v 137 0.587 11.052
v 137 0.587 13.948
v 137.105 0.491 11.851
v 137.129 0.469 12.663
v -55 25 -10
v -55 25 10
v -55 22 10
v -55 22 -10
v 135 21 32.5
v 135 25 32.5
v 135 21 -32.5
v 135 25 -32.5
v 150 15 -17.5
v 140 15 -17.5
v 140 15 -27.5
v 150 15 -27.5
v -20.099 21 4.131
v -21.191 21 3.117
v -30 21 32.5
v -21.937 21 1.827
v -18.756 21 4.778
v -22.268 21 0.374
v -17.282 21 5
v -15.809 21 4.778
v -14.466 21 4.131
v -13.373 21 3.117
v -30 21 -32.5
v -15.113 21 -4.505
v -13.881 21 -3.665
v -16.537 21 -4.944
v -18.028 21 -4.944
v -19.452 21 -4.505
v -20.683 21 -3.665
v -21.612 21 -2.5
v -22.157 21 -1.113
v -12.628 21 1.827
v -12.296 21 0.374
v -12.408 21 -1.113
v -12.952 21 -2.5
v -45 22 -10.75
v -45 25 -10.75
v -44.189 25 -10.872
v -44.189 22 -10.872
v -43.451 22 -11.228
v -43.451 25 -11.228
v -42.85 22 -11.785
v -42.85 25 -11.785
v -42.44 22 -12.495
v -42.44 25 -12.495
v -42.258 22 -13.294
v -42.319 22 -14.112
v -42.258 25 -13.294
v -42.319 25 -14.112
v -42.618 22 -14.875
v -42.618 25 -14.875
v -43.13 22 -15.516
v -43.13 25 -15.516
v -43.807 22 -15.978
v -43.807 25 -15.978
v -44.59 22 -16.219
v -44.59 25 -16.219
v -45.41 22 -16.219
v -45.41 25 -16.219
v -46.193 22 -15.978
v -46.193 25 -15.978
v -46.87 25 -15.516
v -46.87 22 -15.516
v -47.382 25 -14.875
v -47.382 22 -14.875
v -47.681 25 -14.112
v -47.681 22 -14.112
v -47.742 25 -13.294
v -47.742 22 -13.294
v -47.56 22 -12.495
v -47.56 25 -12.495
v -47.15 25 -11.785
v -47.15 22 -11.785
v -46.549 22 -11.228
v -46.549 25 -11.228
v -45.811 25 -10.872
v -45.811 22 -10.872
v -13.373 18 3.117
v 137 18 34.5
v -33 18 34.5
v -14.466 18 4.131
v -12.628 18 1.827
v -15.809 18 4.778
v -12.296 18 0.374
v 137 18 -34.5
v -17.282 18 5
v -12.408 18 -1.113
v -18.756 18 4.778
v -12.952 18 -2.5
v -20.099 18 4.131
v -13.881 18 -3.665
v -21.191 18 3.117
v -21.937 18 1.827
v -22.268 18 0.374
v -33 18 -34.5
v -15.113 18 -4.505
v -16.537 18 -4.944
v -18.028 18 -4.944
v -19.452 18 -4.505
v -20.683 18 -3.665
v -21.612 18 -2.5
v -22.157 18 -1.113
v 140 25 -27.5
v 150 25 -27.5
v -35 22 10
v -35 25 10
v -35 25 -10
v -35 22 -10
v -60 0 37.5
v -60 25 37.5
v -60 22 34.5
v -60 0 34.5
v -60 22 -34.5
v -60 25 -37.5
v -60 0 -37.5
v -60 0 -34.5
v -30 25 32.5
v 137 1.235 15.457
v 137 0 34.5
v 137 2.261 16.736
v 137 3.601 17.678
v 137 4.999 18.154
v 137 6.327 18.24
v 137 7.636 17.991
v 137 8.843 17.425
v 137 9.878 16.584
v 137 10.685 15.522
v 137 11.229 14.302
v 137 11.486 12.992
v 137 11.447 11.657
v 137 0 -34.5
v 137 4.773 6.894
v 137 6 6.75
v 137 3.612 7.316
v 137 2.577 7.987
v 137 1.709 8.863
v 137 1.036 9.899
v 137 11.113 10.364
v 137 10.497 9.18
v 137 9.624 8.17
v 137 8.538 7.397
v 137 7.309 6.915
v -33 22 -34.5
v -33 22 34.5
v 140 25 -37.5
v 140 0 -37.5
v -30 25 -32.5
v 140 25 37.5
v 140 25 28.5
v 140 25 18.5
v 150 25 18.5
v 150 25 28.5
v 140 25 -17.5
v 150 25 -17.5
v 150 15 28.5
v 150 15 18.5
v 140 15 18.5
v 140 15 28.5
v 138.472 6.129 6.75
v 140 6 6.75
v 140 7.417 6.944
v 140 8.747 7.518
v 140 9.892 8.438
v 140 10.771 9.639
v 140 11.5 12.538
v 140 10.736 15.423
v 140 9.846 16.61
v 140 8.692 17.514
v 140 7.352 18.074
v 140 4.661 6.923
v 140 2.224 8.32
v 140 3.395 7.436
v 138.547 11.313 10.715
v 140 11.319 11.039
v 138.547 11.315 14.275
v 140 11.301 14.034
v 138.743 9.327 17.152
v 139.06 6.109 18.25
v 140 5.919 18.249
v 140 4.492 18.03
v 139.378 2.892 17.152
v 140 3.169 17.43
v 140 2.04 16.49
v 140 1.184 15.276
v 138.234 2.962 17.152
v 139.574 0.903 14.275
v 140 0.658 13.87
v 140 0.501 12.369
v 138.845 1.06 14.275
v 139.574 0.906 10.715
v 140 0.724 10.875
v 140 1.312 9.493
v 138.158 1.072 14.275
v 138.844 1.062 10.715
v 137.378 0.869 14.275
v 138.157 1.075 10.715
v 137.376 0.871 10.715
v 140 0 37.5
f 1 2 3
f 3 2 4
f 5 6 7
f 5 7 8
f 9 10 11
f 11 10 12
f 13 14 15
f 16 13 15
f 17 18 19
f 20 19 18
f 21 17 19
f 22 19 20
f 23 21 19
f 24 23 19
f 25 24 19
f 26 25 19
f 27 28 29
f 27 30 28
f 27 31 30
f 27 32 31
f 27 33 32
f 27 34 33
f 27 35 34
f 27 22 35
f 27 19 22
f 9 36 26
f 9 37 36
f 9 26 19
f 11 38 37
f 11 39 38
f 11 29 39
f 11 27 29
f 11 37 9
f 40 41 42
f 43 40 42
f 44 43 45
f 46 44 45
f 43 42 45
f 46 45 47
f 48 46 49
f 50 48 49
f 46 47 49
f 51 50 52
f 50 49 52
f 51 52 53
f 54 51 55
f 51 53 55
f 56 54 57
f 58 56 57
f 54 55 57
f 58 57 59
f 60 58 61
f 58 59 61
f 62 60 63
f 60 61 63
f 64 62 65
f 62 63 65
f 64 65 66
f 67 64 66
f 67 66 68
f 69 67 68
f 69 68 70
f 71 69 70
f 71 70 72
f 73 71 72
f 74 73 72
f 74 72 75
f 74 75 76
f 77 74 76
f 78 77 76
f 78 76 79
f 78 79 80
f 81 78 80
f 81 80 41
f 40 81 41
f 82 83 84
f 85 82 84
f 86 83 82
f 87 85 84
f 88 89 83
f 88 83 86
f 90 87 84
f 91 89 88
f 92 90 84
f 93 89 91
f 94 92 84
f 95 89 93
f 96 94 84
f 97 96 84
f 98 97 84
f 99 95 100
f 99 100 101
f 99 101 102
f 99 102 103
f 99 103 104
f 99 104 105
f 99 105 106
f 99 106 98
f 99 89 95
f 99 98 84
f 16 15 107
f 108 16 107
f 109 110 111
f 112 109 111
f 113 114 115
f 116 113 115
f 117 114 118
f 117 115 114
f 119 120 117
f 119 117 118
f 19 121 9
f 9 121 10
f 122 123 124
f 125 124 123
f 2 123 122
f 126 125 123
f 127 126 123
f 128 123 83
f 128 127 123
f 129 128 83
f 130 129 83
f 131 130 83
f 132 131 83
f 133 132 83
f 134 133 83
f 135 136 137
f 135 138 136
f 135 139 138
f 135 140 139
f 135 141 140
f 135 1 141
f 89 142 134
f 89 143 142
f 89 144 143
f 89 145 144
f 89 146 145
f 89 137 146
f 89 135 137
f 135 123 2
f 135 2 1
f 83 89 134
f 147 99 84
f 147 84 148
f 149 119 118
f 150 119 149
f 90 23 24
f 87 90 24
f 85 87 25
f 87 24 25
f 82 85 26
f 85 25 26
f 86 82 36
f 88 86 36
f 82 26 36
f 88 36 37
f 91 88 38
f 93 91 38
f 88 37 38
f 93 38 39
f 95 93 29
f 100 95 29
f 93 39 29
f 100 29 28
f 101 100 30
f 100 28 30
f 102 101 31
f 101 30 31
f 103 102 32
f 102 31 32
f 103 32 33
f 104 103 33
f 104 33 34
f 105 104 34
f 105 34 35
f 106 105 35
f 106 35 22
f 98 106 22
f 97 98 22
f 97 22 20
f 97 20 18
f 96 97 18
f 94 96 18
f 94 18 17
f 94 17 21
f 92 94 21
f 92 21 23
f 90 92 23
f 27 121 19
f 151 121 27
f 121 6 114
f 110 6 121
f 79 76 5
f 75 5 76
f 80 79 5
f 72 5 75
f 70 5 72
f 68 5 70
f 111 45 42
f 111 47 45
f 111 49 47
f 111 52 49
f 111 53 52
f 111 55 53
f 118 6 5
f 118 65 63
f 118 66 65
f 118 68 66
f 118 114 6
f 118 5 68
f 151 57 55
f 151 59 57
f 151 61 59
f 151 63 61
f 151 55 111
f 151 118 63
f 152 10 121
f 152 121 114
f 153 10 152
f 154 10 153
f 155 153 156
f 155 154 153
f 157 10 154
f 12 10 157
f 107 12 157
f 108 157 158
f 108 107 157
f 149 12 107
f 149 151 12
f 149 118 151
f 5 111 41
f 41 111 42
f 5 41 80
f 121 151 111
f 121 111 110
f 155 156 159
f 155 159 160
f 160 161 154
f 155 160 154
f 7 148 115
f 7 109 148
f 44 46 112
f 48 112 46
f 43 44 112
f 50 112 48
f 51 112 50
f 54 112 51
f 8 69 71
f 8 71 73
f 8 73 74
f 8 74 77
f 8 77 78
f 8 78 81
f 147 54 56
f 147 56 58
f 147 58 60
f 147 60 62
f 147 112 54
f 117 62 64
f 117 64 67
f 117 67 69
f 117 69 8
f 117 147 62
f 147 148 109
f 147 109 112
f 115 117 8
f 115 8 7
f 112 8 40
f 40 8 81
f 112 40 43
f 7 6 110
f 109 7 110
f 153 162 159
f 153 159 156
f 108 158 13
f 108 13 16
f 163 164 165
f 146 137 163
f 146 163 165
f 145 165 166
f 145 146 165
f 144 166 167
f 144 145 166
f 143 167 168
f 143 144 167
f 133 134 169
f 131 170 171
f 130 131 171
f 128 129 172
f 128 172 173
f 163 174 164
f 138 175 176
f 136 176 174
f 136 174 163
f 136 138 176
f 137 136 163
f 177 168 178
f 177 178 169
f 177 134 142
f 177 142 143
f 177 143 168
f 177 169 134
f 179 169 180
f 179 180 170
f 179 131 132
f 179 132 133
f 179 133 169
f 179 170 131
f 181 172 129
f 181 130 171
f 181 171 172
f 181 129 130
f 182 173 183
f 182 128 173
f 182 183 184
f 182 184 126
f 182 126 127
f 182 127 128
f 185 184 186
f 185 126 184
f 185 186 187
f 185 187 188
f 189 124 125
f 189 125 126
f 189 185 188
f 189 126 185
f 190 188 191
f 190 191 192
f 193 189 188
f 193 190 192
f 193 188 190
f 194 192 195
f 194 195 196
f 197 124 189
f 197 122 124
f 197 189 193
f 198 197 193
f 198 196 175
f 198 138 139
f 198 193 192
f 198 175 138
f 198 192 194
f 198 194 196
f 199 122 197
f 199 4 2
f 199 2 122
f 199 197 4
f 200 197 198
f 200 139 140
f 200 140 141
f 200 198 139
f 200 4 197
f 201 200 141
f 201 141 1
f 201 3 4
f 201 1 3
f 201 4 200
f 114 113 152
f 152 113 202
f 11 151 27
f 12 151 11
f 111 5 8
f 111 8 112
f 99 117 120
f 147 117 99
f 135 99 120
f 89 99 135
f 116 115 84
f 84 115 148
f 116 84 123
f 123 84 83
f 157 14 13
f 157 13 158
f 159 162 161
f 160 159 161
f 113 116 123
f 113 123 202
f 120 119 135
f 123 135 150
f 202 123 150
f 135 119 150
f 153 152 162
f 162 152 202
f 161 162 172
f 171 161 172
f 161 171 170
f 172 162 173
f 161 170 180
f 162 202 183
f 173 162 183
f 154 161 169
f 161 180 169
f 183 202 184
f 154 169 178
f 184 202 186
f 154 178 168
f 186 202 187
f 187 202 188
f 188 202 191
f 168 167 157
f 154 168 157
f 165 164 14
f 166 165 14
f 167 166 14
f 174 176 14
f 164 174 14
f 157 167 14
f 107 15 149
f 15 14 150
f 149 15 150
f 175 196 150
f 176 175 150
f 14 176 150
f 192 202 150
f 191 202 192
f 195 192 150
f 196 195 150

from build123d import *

# Parameters (mm, degrees)
SKETCH1_W           = 200
SKETCH1_H           = 75
BOSS_EXTRUDE1_DEPTH = 25
SKETCH9_W           = 165
SKETCH9_H           = 65
CUT_EXTRUDE5_DEPTH  = 4
SHELL3_START        = -34.5
SHELL3_DEPTH        = 69
SKETCH14_W          = 10
SKETCH14_H          = 10
BOSS_EXTRUDE5_DEPTH = 10
SKETCH15_R          = 5
CUT_EXTRUDE7_DEPTH  = 157.036053526
SKETCH16_W          = 20
SKETCH16_H          = 20
CUT_EXTRUDE8_DEPTH  = 157.624551077
SKETCH19_RX         = 5.75
SKETCH19_RY         = 5.5
SKETCH21_R          = 2.75
CUT_EXTRUDE9_DEPTH  = 157.624551117


# Read off the part's stored shape, not the designer's step: Shell3
with BuildPart() as part:
    # Sketch1 → Boss-Extrude1 (new body)
    with BuildSketch(Plane(origin=(0, 0, 0), x_dir=(1, 0, 0), z_dir=(0, 1, 0))):
        with Locations((40, 0)):
            Rectangle(SKETCH1_W, SKETCH1_H)
    extrude(amount=BOSS_EXTRUDE1_DEPTH)

    # Sketch9 → Cut-Extrude5 (cut)
    with BuildSketch(Plane(origin=(0, 25, 0), x_dir=(1, 0, 0), z_dir=(0, 1, 0))):
        with Locations((52.5, 0)):
            Rectangle(SKETCH9_W, SKETCH9_H)
    extrude(amount=-CUT_EXTRUDE5_DEPTH, mode=Mode.SUBTRACT)

    # Shell3 outline → Shell3 (cut)
    with BuildSketch(Plane.XY.offset(SHELL3_START)):
        Polygon((137, 0), (137, 18), (-33, 18), (-33, 22), (-60, 22), (-60, 0), align=None)
    extrude(amount=SHELL3_DEPTH, mode=Mode.SUBTRACT)

    # Sketch14 → Boss-Extrude5 (add)
    with BuildSketch(Plane(origin=(140, 0, 0), x_dir=(0, 0, -1), z_dir=(1, 0, 0))):
        with Locations((-23.5, 20)):
            Rectangle(SKETCH14_W, SKETCH14_H)
        with Locations((22.5, 20)):
            Rectangle(SKETCH14_W, SKETCH14_H)
    extrude(amount=BOSS_EXTRUDE5_DEPTH)

    # Sketch15 → Cut-Extrude7 (cut, through all)
    with BuildSketch(Plane(origin=(0, 21, 0), x_dir=(1, 0, 0), z_dir=(0, 1, 0))):
        with Locations(Location((-17.28231035, 0, 0), (0, 0, 270))):
            Circle(SKETCH15_R)
    extrude(amount=-CUT_EXTRUDE7_DEPTH, mode=Mode.SUBTRACT)

    # Sketch16 → Cut-Extrude8 (cut, through all)
    with BuildSketch(Plane(origin=(0, 25, 0), x_dir=(1, 0, 0), z_dir=(0, 1, 0))):
        with Locations((-45, 0)):
            Rectangle(SKETCH16_W, SKETCH16_H)
    extrude(amount=-CUT_EXTRUDE8_DEPTH, mode=Mode.SUBTRACT)

    # Cut-Sweep2: sweep along a path in Sketch20
    with BuildLine() as cut_sweep2_path:  # in the path sketch's own coordinates; laid on its plane below (add() does not lay a ready-made edge on the line's plane)
        add(Edge.make_bspline(
            [(-140, 6), (-136.19888528, 6.630281352), (-133.075750061, 4.182881523)],
            knots=[0, 0, 0, 1, 1, 1], degree=2))
    # Sketch19 → Cut-Sweep2 (sweep, cut)
    with BuildSketch(Plane(origin=(140, 0, 0), x_dir=(0, 0, -1), z_dir=(1, 0, 0))):
        with Locations(Location((-12.5, 6), (0, 0, 0))):
            Ellipse(SKETCH19_RX, SKETCH19_RY)
    sweep(path=Plane(origin=(0, 0, 0), x_dir=(-1, 0, 0), z_dir=(0, 0, -1)) * cut_sweep2_path.line, mode=Mode.SUBTRACT)

    # Sketch21 → Cut-Extrude9 (cut, through all)
    with BuildSketch(Plane(origin=(0, 25, 0), x_dir=(1, 0, 0), z_dir=(0, 1, 0))):
        with Locations(Location((-45, 13.5, 0), (0, 0, 270))):
            Circle(SKETCH21_R)
    extrude(amount=-CUT_EXTRUDE9_DEPTH, mode=Mode.SUBTRACT)


solid = part.part
